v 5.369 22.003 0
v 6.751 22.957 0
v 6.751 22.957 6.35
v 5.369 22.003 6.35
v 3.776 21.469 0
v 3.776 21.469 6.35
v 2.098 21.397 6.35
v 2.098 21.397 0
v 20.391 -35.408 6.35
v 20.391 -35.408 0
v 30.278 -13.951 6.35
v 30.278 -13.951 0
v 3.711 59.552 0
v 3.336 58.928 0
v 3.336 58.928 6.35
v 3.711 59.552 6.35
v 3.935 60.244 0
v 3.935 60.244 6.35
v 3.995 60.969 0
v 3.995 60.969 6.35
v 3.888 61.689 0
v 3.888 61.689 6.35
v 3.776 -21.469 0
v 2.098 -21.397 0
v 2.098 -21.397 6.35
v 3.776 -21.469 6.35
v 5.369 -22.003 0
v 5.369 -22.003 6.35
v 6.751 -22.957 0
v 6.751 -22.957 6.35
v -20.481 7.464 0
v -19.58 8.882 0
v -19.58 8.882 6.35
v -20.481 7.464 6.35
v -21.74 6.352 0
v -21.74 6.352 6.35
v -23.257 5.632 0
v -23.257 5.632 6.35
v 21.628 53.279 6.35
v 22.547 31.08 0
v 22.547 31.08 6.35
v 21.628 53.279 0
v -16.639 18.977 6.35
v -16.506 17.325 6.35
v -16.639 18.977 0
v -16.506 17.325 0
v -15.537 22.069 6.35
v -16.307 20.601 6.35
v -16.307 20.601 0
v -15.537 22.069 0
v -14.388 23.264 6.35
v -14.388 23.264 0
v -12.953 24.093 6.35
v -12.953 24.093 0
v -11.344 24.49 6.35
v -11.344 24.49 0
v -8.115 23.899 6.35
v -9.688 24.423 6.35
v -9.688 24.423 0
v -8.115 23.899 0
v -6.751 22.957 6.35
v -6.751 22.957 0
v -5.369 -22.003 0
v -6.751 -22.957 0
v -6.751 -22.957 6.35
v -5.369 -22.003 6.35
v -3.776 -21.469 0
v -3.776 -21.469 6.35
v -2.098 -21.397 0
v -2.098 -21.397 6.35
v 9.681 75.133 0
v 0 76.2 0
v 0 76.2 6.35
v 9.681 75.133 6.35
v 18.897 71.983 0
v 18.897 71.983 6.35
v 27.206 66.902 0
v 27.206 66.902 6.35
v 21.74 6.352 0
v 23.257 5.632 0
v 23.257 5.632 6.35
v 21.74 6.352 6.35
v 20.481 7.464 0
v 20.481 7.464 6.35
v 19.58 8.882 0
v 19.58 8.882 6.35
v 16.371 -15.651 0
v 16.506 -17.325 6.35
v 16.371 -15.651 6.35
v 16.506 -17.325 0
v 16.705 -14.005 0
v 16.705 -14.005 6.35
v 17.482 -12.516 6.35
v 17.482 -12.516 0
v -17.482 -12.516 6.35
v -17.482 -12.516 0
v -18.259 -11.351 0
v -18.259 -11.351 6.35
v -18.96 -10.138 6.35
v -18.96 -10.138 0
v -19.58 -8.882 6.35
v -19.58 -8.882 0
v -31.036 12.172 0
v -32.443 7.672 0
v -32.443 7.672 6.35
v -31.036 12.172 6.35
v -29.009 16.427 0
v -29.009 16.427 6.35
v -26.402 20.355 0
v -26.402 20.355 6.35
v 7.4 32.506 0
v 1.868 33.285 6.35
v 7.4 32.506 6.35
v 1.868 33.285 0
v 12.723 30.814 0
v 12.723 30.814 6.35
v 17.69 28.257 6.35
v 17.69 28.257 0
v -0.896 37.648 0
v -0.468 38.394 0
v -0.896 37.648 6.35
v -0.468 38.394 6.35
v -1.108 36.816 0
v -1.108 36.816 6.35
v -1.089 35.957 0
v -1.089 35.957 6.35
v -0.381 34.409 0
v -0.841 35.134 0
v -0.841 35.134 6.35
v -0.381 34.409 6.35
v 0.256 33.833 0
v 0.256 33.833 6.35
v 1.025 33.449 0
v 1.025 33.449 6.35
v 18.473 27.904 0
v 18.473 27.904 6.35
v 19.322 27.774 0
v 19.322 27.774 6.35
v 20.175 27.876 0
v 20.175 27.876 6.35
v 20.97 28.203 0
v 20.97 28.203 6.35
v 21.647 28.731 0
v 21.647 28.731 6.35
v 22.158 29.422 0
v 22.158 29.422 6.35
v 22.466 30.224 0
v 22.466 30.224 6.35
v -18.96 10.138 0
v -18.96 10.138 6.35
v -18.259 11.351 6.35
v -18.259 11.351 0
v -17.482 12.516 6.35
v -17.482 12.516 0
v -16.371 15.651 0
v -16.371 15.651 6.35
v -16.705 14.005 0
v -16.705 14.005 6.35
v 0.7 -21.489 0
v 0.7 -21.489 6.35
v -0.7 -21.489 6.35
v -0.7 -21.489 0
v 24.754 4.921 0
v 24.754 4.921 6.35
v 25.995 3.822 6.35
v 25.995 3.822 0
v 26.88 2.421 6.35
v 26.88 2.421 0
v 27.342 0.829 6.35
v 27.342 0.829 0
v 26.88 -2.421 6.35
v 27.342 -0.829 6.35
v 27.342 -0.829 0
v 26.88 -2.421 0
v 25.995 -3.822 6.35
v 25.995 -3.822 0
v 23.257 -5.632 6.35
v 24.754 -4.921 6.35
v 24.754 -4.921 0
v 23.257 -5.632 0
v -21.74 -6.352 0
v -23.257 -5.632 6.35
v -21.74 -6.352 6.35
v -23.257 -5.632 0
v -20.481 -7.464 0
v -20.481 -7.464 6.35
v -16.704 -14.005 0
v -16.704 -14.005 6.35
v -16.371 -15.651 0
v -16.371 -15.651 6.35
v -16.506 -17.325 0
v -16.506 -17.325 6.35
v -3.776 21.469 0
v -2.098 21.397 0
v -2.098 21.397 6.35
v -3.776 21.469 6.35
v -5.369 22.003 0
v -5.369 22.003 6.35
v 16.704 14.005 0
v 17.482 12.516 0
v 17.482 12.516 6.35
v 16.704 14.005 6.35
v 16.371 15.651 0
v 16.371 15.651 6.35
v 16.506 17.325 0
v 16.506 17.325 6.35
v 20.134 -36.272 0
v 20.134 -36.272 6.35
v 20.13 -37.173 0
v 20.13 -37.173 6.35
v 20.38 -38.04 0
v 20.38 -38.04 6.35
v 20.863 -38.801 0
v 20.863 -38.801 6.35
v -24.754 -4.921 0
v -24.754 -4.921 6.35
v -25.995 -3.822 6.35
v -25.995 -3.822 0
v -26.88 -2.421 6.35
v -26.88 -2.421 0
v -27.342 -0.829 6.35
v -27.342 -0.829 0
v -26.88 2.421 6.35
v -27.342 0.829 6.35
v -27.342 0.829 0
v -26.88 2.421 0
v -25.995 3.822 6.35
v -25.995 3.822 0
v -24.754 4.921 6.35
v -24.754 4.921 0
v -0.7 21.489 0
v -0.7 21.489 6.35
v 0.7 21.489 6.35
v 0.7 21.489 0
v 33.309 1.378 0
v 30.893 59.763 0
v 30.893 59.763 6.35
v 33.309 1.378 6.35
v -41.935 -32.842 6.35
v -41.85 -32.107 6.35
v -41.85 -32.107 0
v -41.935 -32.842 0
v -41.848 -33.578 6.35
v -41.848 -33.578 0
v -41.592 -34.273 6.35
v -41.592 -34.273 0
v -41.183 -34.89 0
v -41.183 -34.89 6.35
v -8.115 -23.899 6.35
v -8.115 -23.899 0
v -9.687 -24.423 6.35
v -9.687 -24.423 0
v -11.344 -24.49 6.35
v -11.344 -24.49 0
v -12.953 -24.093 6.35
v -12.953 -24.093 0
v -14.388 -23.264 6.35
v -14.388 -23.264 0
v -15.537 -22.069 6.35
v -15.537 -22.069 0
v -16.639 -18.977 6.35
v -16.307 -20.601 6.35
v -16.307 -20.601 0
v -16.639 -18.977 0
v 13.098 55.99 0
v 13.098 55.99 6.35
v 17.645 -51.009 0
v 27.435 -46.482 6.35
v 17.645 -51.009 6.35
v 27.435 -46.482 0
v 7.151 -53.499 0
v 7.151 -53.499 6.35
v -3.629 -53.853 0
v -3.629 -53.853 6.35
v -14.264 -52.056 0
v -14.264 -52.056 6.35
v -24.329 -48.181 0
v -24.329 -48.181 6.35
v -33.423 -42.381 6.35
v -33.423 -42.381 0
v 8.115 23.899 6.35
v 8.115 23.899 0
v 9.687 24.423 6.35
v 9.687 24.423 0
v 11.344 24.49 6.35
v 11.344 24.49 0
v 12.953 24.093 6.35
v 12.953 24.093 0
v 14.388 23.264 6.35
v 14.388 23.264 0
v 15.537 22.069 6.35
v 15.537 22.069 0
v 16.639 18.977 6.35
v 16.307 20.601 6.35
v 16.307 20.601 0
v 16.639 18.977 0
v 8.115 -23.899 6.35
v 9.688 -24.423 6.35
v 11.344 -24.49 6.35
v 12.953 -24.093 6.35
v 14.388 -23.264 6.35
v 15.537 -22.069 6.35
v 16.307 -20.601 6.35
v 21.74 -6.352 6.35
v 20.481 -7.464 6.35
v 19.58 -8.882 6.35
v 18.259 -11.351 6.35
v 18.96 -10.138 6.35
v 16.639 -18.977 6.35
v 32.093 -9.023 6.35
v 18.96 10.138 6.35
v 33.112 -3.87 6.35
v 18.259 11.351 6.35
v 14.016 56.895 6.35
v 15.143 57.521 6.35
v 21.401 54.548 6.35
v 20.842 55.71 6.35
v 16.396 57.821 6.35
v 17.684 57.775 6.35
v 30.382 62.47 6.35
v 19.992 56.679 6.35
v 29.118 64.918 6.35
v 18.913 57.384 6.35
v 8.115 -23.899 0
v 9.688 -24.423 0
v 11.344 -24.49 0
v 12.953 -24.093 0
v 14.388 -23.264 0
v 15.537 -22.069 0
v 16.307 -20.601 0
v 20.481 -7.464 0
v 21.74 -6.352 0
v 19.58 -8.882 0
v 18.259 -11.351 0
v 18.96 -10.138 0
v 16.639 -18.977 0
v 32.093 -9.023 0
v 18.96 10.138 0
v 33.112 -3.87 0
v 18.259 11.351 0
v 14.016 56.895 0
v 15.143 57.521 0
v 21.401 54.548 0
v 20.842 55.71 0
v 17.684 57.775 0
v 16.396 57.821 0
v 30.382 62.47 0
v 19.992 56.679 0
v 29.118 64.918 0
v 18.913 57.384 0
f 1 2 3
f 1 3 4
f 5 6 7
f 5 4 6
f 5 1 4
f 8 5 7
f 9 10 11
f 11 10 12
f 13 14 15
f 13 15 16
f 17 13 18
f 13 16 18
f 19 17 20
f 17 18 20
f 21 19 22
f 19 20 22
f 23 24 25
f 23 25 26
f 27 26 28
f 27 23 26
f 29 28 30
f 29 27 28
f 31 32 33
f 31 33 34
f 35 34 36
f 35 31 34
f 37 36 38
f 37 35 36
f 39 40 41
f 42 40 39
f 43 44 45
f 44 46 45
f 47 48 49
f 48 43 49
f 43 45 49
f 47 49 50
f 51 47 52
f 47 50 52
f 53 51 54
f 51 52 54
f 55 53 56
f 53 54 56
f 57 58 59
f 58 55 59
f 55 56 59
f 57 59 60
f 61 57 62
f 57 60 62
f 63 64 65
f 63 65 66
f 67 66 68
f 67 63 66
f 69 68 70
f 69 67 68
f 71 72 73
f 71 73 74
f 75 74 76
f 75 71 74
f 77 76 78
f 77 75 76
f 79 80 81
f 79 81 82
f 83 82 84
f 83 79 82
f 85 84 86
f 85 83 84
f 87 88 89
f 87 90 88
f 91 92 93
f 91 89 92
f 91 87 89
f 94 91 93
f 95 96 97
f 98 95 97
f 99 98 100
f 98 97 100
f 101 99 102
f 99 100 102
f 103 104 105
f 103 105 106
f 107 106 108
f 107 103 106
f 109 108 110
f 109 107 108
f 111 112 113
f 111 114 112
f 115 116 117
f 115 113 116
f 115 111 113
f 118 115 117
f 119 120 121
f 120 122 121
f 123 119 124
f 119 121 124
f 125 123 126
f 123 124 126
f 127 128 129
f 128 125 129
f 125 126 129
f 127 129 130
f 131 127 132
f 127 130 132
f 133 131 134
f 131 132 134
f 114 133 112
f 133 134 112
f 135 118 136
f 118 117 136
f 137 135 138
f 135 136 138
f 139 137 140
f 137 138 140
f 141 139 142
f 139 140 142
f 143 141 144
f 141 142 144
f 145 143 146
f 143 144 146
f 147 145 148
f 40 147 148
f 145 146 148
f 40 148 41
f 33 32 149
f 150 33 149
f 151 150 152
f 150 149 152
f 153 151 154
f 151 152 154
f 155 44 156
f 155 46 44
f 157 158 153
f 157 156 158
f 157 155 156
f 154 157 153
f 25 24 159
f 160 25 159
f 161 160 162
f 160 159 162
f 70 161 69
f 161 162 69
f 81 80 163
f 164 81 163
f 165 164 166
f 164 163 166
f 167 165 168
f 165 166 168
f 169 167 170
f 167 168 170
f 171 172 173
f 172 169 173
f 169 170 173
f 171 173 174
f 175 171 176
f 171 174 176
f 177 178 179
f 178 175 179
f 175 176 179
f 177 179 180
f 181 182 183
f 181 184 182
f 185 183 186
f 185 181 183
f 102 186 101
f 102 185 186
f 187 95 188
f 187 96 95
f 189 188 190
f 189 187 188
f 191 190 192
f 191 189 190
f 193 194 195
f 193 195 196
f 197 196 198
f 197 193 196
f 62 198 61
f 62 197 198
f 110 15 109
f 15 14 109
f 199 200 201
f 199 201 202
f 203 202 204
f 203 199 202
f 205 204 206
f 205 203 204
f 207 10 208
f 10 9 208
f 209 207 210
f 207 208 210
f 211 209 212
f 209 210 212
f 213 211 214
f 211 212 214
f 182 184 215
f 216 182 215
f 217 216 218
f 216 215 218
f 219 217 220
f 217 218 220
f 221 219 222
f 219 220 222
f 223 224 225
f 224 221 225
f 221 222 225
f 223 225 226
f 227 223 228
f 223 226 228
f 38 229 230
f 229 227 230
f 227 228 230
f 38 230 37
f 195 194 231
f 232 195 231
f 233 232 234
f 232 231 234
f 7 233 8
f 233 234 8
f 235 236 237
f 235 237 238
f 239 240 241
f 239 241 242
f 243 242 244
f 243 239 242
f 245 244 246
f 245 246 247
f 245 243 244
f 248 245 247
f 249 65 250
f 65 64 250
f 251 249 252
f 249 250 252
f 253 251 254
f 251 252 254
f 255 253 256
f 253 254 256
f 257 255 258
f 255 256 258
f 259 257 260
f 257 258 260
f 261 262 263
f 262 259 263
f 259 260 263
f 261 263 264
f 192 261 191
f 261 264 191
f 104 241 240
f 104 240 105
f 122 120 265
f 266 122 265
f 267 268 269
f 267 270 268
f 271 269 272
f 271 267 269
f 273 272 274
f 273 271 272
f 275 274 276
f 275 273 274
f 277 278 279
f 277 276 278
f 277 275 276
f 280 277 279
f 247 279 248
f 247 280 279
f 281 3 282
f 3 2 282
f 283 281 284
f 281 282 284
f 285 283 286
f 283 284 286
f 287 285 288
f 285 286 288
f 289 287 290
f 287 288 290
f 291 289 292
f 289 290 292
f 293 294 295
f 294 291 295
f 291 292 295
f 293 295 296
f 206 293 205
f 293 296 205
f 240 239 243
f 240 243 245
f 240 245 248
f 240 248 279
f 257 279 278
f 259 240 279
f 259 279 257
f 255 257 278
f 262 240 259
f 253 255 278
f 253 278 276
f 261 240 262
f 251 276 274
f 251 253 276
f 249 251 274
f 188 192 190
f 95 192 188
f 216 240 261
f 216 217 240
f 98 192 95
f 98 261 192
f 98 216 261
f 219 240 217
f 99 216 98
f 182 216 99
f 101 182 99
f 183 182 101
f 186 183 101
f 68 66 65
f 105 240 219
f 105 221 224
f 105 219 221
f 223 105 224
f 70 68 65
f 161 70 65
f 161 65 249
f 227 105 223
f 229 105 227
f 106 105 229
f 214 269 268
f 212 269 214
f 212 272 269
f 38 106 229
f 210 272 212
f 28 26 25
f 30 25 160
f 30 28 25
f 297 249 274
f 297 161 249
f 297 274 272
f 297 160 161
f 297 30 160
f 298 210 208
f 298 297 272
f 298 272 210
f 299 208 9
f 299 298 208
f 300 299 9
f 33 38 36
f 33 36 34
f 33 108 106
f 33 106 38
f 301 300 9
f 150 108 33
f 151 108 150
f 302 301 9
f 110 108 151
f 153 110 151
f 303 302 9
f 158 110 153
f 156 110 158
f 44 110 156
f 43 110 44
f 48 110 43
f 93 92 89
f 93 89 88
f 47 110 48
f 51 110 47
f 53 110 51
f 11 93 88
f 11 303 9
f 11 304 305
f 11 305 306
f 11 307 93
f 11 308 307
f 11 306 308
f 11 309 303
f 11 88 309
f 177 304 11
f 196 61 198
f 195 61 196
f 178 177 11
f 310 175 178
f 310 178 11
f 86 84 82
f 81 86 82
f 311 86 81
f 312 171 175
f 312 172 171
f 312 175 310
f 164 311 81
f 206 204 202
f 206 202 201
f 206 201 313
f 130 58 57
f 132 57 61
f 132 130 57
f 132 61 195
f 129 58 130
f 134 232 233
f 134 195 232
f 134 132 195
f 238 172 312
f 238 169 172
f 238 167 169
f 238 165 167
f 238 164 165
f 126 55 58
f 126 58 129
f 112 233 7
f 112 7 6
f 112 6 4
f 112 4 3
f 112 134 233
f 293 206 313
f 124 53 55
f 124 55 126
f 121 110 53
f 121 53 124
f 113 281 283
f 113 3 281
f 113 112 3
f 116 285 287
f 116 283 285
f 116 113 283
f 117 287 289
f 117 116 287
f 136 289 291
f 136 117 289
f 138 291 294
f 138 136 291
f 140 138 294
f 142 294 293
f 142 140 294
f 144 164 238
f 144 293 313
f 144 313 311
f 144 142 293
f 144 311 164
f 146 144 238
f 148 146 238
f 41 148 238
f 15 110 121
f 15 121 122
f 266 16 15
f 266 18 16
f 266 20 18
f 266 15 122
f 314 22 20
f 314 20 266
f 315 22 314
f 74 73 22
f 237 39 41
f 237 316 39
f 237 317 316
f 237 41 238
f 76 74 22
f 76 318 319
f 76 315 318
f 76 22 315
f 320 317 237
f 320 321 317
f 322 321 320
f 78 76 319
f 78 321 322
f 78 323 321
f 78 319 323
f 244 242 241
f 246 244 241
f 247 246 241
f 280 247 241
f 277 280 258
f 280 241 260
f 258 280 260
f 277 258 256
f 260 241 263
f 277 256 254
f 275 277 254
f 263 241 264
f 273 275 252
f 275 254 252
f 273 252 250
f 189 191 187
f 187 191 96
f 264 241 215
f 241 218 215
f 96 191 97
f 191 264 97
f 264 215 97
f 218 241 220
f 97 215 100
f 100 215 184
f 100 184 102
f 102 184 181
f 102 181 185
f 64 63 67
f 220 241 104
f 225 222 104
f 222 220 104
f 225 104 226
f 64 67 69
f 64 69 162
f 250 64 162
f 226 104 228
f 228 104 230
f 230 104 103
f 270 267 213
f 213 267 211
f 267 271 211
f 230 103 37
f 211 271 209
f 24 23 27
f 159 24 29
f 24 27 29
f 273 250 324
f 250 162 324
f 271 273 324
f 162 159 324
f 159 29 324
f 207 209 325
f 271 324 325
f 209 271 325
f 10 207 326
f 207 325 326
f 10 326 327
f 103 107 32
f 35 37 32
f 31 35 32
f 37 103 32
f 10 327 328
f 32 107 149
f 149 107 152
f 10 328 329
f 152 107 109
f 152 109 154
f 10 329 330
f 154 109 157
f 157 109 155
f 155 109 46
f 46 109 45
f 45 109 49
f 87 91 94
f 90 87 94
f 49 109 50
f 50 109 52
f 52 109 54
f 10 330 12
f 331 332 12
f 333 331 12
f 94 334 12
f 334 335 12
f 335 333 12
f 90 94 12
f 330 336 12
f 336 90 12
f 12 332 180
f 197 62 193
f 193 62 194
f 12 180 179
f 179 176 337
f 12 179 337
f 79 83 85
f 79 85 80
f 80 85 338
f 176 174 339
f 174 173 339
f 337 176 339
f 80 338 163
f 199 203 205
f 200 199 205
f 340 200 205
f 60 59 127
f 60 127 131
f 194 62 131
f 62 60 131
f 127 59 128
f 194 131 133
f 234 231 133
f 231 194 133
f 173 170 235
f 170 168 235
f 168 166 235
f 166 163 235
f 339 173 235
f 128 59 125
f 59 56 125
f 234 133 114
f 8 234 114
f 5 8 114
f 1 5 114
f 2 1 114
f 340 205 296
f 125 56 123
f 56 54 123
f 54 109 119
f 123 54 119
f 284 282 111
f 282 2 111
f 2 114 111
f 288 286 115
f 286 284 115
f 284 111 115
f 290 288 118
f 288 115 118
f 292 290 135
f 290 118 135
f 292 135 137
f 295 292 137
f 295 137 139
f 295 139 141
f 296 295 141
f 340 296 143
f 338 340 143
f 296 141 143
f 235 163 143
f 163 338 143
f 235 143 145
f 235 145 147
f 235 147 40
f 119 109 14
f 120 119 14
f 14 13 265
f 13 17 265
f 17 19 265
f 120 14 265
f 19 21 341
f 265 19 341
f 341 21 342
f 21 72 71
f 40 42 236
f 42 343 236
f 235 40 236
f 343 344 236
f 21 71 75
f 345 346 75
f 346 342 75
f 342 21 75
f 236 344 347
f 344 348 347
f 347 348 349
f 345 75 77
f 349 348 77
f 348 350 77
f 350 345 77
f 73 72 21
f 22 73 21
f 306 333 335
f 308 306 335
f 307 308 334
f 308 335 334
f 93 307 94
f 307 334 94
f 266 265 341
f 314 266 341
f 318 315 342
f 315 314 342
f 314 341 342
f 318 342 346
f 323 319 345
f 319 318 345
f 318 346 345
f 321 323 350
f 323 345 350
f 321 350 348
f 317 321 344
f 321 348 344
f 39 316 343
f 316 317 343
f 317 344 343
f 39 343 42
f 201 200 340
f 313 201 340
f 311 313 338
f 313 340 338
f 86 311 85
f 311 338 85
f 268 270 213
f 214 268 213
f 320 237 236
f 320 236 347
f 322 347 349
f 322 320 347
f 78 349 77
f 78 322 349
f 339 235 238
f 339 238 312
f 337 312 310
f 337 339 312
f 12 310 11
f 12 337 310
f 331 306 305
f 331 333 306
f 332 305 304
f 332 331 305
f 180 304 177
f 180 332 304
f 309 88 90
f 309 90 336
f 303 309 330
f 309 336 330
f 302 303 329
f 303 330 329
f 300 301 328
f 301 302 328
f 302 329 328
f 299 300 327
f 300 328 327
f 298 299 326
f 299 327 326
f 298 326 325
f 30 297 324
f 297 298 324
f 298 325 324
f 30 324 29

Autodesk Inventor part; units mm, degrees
ref_plane "YZ Plane" through (0, 0, 0) normal (1, 0, 0) x (0, 1, 0)
ref_plane "XZ Plane" through (0, 0, 0) normal (0, 1, 0) x (-1, 0, 0)
ref_plane "XY Plane" through (0, 0, 0) normal (0, 0, 1) x (1, 0, 0)
sketch "Sketch1" plane through (0, 0, 0) normal (0, 0, 1) x (1, 0, 0)
  circle A0 centre (0, 0) radius 76.2 construction
  circle A1 centre (0, 0) radius 21.5
  circle A2 centre (0, 0) radius 21.5 construction
  circle A3 centre (0, 0) radius 33.3375
  line L0 (0, 76.2) -> (0, 0) construction
  line L1 (0, 76.2) -> (4.2947, 60.1719)
  line L2 (4.2947, 60.1719) -> (-26.4022, 20.3547)
  circle A4 centre (0, 0) radius 60.325 construction
  arc A5 (30.7227, 63.8735) -> (0, 76.2) centre (0, 31.75) ccw
  line L3 (30.7227, 63.8735) -> (33.309, 1.3784)
  circle A6 centre (0, 0) radius 53.975 construction
  line L4 (27.435, -46.4825) -> (0, 0) construction
  line L5 (27.435, -46.4825) -> (19.5403, -37.2553)
  line L6 (19.5403, -37.2553) -> (30.278, -13.951)
  circle A7 centre (0, 0) radius 42.0688 construction
  arc A8 (-42.2119, -33.6371) -> (27.435, -46.4825) centre (0, 0) ccw
  line L7 (-42.2119, -33.6371) -> (-32.4426, 7.6724)
  line L8 (-42.2119, -33.6371) -> (0, 0) construction
  line L9 (-4.6134, 33.0167) -> (13.0978, 55.9902)
  line L10 (22.8274, 24.296) -> (21.628, 53.2793)
  arc A9 (21.628, 53.2793) -> (13.0978, 55.9902) centre (16.8696, 53.0824) ccw
  line L11 (0, 0) -> (-10.75, 18.6195) construction
  arc A10 (-6.7508, 22.9574) -> (-16.5062, 17.3251) centre (-10.75, 18.6195) ccw
  arc A11 (-17.4815, 12.5159) -> (-16.5062, 17.3251) centre (-22.3601, 16.0087) ccw
  arc A12 (-6.7508, 22.9574) -> (-2.0983, 21.3974) centre (-2.6839, 27.3687) ccw
  arc A13 (16.5062, 17.3251) -> (17.4815, 12.5159) centre (22.3601, 16.0087) ccw
  arc A14 (16.5062, 17.3251) -> (6.7508, 22.9574) centre (10.75, 18.6195) ccw
  arc A15 (2.0983, 21.3974) -> (6.7508, 22.9574) centre (2.6839, 27.3687) ccw
  arc A16 (23.2571, -5.6323) -> (19.5798, -8.8815) centre (25.044, -11.36) ccw
  arc A17 (23.2571, -5.6323) -> (23.2571, 5.6323) centre (21.5, 0) ccw
  arc A18 (19.5798, 8.8815) -> (23.2571, 5.6323) centre (25.044, 11.36) ccw
  arc A19 (6.7508, -22.9574) -> (2.0983, -21.3974) centre (2.6839, -27.3687) ccw
  arc A20 (6.7508, -22.9574) -> (16.5062, -17.3251) centre (10.75, -18.6195) ccw
  arc A21 (17.4815, -12.5159) -> (16.5062, -17.3251) centre (22.3601, -16.0087) ccw
  arc A22 (-16.5062, -17.3251) -> (-17.4815, -12.5159) centre (-22.3601, -16.0087) ccw
  arc A23 (-16.5062, -17.3251) -> (-6.7508, -22.9574) centre (-10.75, -18.6195) ccw
  arc A24 (-2.0983, -21.3974) -> (-6.7508, -22.9574) centre (-2.6839, -27.3687) ccw
  arc A25 (-23.2571, 5.6323) -> (-19.5798, 8.8815) centre (-25.044, 11.36) ccw
  arc A26 (-23.2571, 5.6323) -> (-23.2571, -5.6323) centre (-21.5, 0) ccw
  arc A27 (-19.5798, -8.8815) -> (-23.2571, -5.6323) centre (-25.044, -11.36) ccw
  point P0 (25.3939, -0.9713)
  point P1 (-23.0466, 22.3171)
  point P2 (-2.0983, 21.3974)
  point P3 (2.0983, 21.3974)
  point P4 (17.4815, 12.5159)
  point P5 (19.5798, -8.8815)
  point P6 (2.0983, -21.3974)
  point P7 (-2.0983, -21.3974)
  point P8 (-17.4815, -12.5159)
  point P9 (-19.5798, -8.8815)
  point P10 (-19.5798, 8.8815)
  dimension "d0" = 152.4
  dimension "d14" = 15.875
  dimension "d17" = 84.1375
  dimension "d1" = 43
  dimension "d2" = 43
  dimension "d8" = 66.675
  dimension "d9" = 15
  dimension "d11" = 44.45
  dimension "d12" = 40
  dimension "d15" = 107.95
  dimension "d16" = 10
  dimension "d18" = 30.55
  dimension "d19" = 82
  dimension "d28" = 9.525
  dimension "d29" = 9.525
  dimension "d30" = 4.7625
  dimension "d46" = 11.8
  dimension "d47" = 6
  dimension "d48" = 30
  dimension "d51" = 360
extrude "Extrusion1" add sketch "Sketch1" along normal blind 6.35 contours A3 | A3 L10 A9 L9 L2 L1 A5 L3 | L6 L5 A8 L7 A3
fillet "Fillet1" radius 3.175 4 edges at (19.5403, -37.2553, 3.175) (4.2947, 60.1719, 3.175) (-4.6134, 33.0167, 3.175) (22.8274, 24.296, 3.175)
fillet "Fillet3" radius 3.175 1 edges at (-42.2119, -33.6371, 3.175)
sketch "Sketch2" plane through (0, 0, 6.35) normal (0, 0, 1) x (1, 0, 0)
  arc A0 (30.7227, 63.8735) -> (0, 76.2) centre (0, 31.75) ccw construction
  circle A1 centre (0, 0) radius 76.2 construction
fillet "Fillet4" radius 9.525 1 edges at (30.7227, 63.8735, 3.175)
equation "\"d29\" = d28"
properties part number "Blade" material "Steel, Alloy"
